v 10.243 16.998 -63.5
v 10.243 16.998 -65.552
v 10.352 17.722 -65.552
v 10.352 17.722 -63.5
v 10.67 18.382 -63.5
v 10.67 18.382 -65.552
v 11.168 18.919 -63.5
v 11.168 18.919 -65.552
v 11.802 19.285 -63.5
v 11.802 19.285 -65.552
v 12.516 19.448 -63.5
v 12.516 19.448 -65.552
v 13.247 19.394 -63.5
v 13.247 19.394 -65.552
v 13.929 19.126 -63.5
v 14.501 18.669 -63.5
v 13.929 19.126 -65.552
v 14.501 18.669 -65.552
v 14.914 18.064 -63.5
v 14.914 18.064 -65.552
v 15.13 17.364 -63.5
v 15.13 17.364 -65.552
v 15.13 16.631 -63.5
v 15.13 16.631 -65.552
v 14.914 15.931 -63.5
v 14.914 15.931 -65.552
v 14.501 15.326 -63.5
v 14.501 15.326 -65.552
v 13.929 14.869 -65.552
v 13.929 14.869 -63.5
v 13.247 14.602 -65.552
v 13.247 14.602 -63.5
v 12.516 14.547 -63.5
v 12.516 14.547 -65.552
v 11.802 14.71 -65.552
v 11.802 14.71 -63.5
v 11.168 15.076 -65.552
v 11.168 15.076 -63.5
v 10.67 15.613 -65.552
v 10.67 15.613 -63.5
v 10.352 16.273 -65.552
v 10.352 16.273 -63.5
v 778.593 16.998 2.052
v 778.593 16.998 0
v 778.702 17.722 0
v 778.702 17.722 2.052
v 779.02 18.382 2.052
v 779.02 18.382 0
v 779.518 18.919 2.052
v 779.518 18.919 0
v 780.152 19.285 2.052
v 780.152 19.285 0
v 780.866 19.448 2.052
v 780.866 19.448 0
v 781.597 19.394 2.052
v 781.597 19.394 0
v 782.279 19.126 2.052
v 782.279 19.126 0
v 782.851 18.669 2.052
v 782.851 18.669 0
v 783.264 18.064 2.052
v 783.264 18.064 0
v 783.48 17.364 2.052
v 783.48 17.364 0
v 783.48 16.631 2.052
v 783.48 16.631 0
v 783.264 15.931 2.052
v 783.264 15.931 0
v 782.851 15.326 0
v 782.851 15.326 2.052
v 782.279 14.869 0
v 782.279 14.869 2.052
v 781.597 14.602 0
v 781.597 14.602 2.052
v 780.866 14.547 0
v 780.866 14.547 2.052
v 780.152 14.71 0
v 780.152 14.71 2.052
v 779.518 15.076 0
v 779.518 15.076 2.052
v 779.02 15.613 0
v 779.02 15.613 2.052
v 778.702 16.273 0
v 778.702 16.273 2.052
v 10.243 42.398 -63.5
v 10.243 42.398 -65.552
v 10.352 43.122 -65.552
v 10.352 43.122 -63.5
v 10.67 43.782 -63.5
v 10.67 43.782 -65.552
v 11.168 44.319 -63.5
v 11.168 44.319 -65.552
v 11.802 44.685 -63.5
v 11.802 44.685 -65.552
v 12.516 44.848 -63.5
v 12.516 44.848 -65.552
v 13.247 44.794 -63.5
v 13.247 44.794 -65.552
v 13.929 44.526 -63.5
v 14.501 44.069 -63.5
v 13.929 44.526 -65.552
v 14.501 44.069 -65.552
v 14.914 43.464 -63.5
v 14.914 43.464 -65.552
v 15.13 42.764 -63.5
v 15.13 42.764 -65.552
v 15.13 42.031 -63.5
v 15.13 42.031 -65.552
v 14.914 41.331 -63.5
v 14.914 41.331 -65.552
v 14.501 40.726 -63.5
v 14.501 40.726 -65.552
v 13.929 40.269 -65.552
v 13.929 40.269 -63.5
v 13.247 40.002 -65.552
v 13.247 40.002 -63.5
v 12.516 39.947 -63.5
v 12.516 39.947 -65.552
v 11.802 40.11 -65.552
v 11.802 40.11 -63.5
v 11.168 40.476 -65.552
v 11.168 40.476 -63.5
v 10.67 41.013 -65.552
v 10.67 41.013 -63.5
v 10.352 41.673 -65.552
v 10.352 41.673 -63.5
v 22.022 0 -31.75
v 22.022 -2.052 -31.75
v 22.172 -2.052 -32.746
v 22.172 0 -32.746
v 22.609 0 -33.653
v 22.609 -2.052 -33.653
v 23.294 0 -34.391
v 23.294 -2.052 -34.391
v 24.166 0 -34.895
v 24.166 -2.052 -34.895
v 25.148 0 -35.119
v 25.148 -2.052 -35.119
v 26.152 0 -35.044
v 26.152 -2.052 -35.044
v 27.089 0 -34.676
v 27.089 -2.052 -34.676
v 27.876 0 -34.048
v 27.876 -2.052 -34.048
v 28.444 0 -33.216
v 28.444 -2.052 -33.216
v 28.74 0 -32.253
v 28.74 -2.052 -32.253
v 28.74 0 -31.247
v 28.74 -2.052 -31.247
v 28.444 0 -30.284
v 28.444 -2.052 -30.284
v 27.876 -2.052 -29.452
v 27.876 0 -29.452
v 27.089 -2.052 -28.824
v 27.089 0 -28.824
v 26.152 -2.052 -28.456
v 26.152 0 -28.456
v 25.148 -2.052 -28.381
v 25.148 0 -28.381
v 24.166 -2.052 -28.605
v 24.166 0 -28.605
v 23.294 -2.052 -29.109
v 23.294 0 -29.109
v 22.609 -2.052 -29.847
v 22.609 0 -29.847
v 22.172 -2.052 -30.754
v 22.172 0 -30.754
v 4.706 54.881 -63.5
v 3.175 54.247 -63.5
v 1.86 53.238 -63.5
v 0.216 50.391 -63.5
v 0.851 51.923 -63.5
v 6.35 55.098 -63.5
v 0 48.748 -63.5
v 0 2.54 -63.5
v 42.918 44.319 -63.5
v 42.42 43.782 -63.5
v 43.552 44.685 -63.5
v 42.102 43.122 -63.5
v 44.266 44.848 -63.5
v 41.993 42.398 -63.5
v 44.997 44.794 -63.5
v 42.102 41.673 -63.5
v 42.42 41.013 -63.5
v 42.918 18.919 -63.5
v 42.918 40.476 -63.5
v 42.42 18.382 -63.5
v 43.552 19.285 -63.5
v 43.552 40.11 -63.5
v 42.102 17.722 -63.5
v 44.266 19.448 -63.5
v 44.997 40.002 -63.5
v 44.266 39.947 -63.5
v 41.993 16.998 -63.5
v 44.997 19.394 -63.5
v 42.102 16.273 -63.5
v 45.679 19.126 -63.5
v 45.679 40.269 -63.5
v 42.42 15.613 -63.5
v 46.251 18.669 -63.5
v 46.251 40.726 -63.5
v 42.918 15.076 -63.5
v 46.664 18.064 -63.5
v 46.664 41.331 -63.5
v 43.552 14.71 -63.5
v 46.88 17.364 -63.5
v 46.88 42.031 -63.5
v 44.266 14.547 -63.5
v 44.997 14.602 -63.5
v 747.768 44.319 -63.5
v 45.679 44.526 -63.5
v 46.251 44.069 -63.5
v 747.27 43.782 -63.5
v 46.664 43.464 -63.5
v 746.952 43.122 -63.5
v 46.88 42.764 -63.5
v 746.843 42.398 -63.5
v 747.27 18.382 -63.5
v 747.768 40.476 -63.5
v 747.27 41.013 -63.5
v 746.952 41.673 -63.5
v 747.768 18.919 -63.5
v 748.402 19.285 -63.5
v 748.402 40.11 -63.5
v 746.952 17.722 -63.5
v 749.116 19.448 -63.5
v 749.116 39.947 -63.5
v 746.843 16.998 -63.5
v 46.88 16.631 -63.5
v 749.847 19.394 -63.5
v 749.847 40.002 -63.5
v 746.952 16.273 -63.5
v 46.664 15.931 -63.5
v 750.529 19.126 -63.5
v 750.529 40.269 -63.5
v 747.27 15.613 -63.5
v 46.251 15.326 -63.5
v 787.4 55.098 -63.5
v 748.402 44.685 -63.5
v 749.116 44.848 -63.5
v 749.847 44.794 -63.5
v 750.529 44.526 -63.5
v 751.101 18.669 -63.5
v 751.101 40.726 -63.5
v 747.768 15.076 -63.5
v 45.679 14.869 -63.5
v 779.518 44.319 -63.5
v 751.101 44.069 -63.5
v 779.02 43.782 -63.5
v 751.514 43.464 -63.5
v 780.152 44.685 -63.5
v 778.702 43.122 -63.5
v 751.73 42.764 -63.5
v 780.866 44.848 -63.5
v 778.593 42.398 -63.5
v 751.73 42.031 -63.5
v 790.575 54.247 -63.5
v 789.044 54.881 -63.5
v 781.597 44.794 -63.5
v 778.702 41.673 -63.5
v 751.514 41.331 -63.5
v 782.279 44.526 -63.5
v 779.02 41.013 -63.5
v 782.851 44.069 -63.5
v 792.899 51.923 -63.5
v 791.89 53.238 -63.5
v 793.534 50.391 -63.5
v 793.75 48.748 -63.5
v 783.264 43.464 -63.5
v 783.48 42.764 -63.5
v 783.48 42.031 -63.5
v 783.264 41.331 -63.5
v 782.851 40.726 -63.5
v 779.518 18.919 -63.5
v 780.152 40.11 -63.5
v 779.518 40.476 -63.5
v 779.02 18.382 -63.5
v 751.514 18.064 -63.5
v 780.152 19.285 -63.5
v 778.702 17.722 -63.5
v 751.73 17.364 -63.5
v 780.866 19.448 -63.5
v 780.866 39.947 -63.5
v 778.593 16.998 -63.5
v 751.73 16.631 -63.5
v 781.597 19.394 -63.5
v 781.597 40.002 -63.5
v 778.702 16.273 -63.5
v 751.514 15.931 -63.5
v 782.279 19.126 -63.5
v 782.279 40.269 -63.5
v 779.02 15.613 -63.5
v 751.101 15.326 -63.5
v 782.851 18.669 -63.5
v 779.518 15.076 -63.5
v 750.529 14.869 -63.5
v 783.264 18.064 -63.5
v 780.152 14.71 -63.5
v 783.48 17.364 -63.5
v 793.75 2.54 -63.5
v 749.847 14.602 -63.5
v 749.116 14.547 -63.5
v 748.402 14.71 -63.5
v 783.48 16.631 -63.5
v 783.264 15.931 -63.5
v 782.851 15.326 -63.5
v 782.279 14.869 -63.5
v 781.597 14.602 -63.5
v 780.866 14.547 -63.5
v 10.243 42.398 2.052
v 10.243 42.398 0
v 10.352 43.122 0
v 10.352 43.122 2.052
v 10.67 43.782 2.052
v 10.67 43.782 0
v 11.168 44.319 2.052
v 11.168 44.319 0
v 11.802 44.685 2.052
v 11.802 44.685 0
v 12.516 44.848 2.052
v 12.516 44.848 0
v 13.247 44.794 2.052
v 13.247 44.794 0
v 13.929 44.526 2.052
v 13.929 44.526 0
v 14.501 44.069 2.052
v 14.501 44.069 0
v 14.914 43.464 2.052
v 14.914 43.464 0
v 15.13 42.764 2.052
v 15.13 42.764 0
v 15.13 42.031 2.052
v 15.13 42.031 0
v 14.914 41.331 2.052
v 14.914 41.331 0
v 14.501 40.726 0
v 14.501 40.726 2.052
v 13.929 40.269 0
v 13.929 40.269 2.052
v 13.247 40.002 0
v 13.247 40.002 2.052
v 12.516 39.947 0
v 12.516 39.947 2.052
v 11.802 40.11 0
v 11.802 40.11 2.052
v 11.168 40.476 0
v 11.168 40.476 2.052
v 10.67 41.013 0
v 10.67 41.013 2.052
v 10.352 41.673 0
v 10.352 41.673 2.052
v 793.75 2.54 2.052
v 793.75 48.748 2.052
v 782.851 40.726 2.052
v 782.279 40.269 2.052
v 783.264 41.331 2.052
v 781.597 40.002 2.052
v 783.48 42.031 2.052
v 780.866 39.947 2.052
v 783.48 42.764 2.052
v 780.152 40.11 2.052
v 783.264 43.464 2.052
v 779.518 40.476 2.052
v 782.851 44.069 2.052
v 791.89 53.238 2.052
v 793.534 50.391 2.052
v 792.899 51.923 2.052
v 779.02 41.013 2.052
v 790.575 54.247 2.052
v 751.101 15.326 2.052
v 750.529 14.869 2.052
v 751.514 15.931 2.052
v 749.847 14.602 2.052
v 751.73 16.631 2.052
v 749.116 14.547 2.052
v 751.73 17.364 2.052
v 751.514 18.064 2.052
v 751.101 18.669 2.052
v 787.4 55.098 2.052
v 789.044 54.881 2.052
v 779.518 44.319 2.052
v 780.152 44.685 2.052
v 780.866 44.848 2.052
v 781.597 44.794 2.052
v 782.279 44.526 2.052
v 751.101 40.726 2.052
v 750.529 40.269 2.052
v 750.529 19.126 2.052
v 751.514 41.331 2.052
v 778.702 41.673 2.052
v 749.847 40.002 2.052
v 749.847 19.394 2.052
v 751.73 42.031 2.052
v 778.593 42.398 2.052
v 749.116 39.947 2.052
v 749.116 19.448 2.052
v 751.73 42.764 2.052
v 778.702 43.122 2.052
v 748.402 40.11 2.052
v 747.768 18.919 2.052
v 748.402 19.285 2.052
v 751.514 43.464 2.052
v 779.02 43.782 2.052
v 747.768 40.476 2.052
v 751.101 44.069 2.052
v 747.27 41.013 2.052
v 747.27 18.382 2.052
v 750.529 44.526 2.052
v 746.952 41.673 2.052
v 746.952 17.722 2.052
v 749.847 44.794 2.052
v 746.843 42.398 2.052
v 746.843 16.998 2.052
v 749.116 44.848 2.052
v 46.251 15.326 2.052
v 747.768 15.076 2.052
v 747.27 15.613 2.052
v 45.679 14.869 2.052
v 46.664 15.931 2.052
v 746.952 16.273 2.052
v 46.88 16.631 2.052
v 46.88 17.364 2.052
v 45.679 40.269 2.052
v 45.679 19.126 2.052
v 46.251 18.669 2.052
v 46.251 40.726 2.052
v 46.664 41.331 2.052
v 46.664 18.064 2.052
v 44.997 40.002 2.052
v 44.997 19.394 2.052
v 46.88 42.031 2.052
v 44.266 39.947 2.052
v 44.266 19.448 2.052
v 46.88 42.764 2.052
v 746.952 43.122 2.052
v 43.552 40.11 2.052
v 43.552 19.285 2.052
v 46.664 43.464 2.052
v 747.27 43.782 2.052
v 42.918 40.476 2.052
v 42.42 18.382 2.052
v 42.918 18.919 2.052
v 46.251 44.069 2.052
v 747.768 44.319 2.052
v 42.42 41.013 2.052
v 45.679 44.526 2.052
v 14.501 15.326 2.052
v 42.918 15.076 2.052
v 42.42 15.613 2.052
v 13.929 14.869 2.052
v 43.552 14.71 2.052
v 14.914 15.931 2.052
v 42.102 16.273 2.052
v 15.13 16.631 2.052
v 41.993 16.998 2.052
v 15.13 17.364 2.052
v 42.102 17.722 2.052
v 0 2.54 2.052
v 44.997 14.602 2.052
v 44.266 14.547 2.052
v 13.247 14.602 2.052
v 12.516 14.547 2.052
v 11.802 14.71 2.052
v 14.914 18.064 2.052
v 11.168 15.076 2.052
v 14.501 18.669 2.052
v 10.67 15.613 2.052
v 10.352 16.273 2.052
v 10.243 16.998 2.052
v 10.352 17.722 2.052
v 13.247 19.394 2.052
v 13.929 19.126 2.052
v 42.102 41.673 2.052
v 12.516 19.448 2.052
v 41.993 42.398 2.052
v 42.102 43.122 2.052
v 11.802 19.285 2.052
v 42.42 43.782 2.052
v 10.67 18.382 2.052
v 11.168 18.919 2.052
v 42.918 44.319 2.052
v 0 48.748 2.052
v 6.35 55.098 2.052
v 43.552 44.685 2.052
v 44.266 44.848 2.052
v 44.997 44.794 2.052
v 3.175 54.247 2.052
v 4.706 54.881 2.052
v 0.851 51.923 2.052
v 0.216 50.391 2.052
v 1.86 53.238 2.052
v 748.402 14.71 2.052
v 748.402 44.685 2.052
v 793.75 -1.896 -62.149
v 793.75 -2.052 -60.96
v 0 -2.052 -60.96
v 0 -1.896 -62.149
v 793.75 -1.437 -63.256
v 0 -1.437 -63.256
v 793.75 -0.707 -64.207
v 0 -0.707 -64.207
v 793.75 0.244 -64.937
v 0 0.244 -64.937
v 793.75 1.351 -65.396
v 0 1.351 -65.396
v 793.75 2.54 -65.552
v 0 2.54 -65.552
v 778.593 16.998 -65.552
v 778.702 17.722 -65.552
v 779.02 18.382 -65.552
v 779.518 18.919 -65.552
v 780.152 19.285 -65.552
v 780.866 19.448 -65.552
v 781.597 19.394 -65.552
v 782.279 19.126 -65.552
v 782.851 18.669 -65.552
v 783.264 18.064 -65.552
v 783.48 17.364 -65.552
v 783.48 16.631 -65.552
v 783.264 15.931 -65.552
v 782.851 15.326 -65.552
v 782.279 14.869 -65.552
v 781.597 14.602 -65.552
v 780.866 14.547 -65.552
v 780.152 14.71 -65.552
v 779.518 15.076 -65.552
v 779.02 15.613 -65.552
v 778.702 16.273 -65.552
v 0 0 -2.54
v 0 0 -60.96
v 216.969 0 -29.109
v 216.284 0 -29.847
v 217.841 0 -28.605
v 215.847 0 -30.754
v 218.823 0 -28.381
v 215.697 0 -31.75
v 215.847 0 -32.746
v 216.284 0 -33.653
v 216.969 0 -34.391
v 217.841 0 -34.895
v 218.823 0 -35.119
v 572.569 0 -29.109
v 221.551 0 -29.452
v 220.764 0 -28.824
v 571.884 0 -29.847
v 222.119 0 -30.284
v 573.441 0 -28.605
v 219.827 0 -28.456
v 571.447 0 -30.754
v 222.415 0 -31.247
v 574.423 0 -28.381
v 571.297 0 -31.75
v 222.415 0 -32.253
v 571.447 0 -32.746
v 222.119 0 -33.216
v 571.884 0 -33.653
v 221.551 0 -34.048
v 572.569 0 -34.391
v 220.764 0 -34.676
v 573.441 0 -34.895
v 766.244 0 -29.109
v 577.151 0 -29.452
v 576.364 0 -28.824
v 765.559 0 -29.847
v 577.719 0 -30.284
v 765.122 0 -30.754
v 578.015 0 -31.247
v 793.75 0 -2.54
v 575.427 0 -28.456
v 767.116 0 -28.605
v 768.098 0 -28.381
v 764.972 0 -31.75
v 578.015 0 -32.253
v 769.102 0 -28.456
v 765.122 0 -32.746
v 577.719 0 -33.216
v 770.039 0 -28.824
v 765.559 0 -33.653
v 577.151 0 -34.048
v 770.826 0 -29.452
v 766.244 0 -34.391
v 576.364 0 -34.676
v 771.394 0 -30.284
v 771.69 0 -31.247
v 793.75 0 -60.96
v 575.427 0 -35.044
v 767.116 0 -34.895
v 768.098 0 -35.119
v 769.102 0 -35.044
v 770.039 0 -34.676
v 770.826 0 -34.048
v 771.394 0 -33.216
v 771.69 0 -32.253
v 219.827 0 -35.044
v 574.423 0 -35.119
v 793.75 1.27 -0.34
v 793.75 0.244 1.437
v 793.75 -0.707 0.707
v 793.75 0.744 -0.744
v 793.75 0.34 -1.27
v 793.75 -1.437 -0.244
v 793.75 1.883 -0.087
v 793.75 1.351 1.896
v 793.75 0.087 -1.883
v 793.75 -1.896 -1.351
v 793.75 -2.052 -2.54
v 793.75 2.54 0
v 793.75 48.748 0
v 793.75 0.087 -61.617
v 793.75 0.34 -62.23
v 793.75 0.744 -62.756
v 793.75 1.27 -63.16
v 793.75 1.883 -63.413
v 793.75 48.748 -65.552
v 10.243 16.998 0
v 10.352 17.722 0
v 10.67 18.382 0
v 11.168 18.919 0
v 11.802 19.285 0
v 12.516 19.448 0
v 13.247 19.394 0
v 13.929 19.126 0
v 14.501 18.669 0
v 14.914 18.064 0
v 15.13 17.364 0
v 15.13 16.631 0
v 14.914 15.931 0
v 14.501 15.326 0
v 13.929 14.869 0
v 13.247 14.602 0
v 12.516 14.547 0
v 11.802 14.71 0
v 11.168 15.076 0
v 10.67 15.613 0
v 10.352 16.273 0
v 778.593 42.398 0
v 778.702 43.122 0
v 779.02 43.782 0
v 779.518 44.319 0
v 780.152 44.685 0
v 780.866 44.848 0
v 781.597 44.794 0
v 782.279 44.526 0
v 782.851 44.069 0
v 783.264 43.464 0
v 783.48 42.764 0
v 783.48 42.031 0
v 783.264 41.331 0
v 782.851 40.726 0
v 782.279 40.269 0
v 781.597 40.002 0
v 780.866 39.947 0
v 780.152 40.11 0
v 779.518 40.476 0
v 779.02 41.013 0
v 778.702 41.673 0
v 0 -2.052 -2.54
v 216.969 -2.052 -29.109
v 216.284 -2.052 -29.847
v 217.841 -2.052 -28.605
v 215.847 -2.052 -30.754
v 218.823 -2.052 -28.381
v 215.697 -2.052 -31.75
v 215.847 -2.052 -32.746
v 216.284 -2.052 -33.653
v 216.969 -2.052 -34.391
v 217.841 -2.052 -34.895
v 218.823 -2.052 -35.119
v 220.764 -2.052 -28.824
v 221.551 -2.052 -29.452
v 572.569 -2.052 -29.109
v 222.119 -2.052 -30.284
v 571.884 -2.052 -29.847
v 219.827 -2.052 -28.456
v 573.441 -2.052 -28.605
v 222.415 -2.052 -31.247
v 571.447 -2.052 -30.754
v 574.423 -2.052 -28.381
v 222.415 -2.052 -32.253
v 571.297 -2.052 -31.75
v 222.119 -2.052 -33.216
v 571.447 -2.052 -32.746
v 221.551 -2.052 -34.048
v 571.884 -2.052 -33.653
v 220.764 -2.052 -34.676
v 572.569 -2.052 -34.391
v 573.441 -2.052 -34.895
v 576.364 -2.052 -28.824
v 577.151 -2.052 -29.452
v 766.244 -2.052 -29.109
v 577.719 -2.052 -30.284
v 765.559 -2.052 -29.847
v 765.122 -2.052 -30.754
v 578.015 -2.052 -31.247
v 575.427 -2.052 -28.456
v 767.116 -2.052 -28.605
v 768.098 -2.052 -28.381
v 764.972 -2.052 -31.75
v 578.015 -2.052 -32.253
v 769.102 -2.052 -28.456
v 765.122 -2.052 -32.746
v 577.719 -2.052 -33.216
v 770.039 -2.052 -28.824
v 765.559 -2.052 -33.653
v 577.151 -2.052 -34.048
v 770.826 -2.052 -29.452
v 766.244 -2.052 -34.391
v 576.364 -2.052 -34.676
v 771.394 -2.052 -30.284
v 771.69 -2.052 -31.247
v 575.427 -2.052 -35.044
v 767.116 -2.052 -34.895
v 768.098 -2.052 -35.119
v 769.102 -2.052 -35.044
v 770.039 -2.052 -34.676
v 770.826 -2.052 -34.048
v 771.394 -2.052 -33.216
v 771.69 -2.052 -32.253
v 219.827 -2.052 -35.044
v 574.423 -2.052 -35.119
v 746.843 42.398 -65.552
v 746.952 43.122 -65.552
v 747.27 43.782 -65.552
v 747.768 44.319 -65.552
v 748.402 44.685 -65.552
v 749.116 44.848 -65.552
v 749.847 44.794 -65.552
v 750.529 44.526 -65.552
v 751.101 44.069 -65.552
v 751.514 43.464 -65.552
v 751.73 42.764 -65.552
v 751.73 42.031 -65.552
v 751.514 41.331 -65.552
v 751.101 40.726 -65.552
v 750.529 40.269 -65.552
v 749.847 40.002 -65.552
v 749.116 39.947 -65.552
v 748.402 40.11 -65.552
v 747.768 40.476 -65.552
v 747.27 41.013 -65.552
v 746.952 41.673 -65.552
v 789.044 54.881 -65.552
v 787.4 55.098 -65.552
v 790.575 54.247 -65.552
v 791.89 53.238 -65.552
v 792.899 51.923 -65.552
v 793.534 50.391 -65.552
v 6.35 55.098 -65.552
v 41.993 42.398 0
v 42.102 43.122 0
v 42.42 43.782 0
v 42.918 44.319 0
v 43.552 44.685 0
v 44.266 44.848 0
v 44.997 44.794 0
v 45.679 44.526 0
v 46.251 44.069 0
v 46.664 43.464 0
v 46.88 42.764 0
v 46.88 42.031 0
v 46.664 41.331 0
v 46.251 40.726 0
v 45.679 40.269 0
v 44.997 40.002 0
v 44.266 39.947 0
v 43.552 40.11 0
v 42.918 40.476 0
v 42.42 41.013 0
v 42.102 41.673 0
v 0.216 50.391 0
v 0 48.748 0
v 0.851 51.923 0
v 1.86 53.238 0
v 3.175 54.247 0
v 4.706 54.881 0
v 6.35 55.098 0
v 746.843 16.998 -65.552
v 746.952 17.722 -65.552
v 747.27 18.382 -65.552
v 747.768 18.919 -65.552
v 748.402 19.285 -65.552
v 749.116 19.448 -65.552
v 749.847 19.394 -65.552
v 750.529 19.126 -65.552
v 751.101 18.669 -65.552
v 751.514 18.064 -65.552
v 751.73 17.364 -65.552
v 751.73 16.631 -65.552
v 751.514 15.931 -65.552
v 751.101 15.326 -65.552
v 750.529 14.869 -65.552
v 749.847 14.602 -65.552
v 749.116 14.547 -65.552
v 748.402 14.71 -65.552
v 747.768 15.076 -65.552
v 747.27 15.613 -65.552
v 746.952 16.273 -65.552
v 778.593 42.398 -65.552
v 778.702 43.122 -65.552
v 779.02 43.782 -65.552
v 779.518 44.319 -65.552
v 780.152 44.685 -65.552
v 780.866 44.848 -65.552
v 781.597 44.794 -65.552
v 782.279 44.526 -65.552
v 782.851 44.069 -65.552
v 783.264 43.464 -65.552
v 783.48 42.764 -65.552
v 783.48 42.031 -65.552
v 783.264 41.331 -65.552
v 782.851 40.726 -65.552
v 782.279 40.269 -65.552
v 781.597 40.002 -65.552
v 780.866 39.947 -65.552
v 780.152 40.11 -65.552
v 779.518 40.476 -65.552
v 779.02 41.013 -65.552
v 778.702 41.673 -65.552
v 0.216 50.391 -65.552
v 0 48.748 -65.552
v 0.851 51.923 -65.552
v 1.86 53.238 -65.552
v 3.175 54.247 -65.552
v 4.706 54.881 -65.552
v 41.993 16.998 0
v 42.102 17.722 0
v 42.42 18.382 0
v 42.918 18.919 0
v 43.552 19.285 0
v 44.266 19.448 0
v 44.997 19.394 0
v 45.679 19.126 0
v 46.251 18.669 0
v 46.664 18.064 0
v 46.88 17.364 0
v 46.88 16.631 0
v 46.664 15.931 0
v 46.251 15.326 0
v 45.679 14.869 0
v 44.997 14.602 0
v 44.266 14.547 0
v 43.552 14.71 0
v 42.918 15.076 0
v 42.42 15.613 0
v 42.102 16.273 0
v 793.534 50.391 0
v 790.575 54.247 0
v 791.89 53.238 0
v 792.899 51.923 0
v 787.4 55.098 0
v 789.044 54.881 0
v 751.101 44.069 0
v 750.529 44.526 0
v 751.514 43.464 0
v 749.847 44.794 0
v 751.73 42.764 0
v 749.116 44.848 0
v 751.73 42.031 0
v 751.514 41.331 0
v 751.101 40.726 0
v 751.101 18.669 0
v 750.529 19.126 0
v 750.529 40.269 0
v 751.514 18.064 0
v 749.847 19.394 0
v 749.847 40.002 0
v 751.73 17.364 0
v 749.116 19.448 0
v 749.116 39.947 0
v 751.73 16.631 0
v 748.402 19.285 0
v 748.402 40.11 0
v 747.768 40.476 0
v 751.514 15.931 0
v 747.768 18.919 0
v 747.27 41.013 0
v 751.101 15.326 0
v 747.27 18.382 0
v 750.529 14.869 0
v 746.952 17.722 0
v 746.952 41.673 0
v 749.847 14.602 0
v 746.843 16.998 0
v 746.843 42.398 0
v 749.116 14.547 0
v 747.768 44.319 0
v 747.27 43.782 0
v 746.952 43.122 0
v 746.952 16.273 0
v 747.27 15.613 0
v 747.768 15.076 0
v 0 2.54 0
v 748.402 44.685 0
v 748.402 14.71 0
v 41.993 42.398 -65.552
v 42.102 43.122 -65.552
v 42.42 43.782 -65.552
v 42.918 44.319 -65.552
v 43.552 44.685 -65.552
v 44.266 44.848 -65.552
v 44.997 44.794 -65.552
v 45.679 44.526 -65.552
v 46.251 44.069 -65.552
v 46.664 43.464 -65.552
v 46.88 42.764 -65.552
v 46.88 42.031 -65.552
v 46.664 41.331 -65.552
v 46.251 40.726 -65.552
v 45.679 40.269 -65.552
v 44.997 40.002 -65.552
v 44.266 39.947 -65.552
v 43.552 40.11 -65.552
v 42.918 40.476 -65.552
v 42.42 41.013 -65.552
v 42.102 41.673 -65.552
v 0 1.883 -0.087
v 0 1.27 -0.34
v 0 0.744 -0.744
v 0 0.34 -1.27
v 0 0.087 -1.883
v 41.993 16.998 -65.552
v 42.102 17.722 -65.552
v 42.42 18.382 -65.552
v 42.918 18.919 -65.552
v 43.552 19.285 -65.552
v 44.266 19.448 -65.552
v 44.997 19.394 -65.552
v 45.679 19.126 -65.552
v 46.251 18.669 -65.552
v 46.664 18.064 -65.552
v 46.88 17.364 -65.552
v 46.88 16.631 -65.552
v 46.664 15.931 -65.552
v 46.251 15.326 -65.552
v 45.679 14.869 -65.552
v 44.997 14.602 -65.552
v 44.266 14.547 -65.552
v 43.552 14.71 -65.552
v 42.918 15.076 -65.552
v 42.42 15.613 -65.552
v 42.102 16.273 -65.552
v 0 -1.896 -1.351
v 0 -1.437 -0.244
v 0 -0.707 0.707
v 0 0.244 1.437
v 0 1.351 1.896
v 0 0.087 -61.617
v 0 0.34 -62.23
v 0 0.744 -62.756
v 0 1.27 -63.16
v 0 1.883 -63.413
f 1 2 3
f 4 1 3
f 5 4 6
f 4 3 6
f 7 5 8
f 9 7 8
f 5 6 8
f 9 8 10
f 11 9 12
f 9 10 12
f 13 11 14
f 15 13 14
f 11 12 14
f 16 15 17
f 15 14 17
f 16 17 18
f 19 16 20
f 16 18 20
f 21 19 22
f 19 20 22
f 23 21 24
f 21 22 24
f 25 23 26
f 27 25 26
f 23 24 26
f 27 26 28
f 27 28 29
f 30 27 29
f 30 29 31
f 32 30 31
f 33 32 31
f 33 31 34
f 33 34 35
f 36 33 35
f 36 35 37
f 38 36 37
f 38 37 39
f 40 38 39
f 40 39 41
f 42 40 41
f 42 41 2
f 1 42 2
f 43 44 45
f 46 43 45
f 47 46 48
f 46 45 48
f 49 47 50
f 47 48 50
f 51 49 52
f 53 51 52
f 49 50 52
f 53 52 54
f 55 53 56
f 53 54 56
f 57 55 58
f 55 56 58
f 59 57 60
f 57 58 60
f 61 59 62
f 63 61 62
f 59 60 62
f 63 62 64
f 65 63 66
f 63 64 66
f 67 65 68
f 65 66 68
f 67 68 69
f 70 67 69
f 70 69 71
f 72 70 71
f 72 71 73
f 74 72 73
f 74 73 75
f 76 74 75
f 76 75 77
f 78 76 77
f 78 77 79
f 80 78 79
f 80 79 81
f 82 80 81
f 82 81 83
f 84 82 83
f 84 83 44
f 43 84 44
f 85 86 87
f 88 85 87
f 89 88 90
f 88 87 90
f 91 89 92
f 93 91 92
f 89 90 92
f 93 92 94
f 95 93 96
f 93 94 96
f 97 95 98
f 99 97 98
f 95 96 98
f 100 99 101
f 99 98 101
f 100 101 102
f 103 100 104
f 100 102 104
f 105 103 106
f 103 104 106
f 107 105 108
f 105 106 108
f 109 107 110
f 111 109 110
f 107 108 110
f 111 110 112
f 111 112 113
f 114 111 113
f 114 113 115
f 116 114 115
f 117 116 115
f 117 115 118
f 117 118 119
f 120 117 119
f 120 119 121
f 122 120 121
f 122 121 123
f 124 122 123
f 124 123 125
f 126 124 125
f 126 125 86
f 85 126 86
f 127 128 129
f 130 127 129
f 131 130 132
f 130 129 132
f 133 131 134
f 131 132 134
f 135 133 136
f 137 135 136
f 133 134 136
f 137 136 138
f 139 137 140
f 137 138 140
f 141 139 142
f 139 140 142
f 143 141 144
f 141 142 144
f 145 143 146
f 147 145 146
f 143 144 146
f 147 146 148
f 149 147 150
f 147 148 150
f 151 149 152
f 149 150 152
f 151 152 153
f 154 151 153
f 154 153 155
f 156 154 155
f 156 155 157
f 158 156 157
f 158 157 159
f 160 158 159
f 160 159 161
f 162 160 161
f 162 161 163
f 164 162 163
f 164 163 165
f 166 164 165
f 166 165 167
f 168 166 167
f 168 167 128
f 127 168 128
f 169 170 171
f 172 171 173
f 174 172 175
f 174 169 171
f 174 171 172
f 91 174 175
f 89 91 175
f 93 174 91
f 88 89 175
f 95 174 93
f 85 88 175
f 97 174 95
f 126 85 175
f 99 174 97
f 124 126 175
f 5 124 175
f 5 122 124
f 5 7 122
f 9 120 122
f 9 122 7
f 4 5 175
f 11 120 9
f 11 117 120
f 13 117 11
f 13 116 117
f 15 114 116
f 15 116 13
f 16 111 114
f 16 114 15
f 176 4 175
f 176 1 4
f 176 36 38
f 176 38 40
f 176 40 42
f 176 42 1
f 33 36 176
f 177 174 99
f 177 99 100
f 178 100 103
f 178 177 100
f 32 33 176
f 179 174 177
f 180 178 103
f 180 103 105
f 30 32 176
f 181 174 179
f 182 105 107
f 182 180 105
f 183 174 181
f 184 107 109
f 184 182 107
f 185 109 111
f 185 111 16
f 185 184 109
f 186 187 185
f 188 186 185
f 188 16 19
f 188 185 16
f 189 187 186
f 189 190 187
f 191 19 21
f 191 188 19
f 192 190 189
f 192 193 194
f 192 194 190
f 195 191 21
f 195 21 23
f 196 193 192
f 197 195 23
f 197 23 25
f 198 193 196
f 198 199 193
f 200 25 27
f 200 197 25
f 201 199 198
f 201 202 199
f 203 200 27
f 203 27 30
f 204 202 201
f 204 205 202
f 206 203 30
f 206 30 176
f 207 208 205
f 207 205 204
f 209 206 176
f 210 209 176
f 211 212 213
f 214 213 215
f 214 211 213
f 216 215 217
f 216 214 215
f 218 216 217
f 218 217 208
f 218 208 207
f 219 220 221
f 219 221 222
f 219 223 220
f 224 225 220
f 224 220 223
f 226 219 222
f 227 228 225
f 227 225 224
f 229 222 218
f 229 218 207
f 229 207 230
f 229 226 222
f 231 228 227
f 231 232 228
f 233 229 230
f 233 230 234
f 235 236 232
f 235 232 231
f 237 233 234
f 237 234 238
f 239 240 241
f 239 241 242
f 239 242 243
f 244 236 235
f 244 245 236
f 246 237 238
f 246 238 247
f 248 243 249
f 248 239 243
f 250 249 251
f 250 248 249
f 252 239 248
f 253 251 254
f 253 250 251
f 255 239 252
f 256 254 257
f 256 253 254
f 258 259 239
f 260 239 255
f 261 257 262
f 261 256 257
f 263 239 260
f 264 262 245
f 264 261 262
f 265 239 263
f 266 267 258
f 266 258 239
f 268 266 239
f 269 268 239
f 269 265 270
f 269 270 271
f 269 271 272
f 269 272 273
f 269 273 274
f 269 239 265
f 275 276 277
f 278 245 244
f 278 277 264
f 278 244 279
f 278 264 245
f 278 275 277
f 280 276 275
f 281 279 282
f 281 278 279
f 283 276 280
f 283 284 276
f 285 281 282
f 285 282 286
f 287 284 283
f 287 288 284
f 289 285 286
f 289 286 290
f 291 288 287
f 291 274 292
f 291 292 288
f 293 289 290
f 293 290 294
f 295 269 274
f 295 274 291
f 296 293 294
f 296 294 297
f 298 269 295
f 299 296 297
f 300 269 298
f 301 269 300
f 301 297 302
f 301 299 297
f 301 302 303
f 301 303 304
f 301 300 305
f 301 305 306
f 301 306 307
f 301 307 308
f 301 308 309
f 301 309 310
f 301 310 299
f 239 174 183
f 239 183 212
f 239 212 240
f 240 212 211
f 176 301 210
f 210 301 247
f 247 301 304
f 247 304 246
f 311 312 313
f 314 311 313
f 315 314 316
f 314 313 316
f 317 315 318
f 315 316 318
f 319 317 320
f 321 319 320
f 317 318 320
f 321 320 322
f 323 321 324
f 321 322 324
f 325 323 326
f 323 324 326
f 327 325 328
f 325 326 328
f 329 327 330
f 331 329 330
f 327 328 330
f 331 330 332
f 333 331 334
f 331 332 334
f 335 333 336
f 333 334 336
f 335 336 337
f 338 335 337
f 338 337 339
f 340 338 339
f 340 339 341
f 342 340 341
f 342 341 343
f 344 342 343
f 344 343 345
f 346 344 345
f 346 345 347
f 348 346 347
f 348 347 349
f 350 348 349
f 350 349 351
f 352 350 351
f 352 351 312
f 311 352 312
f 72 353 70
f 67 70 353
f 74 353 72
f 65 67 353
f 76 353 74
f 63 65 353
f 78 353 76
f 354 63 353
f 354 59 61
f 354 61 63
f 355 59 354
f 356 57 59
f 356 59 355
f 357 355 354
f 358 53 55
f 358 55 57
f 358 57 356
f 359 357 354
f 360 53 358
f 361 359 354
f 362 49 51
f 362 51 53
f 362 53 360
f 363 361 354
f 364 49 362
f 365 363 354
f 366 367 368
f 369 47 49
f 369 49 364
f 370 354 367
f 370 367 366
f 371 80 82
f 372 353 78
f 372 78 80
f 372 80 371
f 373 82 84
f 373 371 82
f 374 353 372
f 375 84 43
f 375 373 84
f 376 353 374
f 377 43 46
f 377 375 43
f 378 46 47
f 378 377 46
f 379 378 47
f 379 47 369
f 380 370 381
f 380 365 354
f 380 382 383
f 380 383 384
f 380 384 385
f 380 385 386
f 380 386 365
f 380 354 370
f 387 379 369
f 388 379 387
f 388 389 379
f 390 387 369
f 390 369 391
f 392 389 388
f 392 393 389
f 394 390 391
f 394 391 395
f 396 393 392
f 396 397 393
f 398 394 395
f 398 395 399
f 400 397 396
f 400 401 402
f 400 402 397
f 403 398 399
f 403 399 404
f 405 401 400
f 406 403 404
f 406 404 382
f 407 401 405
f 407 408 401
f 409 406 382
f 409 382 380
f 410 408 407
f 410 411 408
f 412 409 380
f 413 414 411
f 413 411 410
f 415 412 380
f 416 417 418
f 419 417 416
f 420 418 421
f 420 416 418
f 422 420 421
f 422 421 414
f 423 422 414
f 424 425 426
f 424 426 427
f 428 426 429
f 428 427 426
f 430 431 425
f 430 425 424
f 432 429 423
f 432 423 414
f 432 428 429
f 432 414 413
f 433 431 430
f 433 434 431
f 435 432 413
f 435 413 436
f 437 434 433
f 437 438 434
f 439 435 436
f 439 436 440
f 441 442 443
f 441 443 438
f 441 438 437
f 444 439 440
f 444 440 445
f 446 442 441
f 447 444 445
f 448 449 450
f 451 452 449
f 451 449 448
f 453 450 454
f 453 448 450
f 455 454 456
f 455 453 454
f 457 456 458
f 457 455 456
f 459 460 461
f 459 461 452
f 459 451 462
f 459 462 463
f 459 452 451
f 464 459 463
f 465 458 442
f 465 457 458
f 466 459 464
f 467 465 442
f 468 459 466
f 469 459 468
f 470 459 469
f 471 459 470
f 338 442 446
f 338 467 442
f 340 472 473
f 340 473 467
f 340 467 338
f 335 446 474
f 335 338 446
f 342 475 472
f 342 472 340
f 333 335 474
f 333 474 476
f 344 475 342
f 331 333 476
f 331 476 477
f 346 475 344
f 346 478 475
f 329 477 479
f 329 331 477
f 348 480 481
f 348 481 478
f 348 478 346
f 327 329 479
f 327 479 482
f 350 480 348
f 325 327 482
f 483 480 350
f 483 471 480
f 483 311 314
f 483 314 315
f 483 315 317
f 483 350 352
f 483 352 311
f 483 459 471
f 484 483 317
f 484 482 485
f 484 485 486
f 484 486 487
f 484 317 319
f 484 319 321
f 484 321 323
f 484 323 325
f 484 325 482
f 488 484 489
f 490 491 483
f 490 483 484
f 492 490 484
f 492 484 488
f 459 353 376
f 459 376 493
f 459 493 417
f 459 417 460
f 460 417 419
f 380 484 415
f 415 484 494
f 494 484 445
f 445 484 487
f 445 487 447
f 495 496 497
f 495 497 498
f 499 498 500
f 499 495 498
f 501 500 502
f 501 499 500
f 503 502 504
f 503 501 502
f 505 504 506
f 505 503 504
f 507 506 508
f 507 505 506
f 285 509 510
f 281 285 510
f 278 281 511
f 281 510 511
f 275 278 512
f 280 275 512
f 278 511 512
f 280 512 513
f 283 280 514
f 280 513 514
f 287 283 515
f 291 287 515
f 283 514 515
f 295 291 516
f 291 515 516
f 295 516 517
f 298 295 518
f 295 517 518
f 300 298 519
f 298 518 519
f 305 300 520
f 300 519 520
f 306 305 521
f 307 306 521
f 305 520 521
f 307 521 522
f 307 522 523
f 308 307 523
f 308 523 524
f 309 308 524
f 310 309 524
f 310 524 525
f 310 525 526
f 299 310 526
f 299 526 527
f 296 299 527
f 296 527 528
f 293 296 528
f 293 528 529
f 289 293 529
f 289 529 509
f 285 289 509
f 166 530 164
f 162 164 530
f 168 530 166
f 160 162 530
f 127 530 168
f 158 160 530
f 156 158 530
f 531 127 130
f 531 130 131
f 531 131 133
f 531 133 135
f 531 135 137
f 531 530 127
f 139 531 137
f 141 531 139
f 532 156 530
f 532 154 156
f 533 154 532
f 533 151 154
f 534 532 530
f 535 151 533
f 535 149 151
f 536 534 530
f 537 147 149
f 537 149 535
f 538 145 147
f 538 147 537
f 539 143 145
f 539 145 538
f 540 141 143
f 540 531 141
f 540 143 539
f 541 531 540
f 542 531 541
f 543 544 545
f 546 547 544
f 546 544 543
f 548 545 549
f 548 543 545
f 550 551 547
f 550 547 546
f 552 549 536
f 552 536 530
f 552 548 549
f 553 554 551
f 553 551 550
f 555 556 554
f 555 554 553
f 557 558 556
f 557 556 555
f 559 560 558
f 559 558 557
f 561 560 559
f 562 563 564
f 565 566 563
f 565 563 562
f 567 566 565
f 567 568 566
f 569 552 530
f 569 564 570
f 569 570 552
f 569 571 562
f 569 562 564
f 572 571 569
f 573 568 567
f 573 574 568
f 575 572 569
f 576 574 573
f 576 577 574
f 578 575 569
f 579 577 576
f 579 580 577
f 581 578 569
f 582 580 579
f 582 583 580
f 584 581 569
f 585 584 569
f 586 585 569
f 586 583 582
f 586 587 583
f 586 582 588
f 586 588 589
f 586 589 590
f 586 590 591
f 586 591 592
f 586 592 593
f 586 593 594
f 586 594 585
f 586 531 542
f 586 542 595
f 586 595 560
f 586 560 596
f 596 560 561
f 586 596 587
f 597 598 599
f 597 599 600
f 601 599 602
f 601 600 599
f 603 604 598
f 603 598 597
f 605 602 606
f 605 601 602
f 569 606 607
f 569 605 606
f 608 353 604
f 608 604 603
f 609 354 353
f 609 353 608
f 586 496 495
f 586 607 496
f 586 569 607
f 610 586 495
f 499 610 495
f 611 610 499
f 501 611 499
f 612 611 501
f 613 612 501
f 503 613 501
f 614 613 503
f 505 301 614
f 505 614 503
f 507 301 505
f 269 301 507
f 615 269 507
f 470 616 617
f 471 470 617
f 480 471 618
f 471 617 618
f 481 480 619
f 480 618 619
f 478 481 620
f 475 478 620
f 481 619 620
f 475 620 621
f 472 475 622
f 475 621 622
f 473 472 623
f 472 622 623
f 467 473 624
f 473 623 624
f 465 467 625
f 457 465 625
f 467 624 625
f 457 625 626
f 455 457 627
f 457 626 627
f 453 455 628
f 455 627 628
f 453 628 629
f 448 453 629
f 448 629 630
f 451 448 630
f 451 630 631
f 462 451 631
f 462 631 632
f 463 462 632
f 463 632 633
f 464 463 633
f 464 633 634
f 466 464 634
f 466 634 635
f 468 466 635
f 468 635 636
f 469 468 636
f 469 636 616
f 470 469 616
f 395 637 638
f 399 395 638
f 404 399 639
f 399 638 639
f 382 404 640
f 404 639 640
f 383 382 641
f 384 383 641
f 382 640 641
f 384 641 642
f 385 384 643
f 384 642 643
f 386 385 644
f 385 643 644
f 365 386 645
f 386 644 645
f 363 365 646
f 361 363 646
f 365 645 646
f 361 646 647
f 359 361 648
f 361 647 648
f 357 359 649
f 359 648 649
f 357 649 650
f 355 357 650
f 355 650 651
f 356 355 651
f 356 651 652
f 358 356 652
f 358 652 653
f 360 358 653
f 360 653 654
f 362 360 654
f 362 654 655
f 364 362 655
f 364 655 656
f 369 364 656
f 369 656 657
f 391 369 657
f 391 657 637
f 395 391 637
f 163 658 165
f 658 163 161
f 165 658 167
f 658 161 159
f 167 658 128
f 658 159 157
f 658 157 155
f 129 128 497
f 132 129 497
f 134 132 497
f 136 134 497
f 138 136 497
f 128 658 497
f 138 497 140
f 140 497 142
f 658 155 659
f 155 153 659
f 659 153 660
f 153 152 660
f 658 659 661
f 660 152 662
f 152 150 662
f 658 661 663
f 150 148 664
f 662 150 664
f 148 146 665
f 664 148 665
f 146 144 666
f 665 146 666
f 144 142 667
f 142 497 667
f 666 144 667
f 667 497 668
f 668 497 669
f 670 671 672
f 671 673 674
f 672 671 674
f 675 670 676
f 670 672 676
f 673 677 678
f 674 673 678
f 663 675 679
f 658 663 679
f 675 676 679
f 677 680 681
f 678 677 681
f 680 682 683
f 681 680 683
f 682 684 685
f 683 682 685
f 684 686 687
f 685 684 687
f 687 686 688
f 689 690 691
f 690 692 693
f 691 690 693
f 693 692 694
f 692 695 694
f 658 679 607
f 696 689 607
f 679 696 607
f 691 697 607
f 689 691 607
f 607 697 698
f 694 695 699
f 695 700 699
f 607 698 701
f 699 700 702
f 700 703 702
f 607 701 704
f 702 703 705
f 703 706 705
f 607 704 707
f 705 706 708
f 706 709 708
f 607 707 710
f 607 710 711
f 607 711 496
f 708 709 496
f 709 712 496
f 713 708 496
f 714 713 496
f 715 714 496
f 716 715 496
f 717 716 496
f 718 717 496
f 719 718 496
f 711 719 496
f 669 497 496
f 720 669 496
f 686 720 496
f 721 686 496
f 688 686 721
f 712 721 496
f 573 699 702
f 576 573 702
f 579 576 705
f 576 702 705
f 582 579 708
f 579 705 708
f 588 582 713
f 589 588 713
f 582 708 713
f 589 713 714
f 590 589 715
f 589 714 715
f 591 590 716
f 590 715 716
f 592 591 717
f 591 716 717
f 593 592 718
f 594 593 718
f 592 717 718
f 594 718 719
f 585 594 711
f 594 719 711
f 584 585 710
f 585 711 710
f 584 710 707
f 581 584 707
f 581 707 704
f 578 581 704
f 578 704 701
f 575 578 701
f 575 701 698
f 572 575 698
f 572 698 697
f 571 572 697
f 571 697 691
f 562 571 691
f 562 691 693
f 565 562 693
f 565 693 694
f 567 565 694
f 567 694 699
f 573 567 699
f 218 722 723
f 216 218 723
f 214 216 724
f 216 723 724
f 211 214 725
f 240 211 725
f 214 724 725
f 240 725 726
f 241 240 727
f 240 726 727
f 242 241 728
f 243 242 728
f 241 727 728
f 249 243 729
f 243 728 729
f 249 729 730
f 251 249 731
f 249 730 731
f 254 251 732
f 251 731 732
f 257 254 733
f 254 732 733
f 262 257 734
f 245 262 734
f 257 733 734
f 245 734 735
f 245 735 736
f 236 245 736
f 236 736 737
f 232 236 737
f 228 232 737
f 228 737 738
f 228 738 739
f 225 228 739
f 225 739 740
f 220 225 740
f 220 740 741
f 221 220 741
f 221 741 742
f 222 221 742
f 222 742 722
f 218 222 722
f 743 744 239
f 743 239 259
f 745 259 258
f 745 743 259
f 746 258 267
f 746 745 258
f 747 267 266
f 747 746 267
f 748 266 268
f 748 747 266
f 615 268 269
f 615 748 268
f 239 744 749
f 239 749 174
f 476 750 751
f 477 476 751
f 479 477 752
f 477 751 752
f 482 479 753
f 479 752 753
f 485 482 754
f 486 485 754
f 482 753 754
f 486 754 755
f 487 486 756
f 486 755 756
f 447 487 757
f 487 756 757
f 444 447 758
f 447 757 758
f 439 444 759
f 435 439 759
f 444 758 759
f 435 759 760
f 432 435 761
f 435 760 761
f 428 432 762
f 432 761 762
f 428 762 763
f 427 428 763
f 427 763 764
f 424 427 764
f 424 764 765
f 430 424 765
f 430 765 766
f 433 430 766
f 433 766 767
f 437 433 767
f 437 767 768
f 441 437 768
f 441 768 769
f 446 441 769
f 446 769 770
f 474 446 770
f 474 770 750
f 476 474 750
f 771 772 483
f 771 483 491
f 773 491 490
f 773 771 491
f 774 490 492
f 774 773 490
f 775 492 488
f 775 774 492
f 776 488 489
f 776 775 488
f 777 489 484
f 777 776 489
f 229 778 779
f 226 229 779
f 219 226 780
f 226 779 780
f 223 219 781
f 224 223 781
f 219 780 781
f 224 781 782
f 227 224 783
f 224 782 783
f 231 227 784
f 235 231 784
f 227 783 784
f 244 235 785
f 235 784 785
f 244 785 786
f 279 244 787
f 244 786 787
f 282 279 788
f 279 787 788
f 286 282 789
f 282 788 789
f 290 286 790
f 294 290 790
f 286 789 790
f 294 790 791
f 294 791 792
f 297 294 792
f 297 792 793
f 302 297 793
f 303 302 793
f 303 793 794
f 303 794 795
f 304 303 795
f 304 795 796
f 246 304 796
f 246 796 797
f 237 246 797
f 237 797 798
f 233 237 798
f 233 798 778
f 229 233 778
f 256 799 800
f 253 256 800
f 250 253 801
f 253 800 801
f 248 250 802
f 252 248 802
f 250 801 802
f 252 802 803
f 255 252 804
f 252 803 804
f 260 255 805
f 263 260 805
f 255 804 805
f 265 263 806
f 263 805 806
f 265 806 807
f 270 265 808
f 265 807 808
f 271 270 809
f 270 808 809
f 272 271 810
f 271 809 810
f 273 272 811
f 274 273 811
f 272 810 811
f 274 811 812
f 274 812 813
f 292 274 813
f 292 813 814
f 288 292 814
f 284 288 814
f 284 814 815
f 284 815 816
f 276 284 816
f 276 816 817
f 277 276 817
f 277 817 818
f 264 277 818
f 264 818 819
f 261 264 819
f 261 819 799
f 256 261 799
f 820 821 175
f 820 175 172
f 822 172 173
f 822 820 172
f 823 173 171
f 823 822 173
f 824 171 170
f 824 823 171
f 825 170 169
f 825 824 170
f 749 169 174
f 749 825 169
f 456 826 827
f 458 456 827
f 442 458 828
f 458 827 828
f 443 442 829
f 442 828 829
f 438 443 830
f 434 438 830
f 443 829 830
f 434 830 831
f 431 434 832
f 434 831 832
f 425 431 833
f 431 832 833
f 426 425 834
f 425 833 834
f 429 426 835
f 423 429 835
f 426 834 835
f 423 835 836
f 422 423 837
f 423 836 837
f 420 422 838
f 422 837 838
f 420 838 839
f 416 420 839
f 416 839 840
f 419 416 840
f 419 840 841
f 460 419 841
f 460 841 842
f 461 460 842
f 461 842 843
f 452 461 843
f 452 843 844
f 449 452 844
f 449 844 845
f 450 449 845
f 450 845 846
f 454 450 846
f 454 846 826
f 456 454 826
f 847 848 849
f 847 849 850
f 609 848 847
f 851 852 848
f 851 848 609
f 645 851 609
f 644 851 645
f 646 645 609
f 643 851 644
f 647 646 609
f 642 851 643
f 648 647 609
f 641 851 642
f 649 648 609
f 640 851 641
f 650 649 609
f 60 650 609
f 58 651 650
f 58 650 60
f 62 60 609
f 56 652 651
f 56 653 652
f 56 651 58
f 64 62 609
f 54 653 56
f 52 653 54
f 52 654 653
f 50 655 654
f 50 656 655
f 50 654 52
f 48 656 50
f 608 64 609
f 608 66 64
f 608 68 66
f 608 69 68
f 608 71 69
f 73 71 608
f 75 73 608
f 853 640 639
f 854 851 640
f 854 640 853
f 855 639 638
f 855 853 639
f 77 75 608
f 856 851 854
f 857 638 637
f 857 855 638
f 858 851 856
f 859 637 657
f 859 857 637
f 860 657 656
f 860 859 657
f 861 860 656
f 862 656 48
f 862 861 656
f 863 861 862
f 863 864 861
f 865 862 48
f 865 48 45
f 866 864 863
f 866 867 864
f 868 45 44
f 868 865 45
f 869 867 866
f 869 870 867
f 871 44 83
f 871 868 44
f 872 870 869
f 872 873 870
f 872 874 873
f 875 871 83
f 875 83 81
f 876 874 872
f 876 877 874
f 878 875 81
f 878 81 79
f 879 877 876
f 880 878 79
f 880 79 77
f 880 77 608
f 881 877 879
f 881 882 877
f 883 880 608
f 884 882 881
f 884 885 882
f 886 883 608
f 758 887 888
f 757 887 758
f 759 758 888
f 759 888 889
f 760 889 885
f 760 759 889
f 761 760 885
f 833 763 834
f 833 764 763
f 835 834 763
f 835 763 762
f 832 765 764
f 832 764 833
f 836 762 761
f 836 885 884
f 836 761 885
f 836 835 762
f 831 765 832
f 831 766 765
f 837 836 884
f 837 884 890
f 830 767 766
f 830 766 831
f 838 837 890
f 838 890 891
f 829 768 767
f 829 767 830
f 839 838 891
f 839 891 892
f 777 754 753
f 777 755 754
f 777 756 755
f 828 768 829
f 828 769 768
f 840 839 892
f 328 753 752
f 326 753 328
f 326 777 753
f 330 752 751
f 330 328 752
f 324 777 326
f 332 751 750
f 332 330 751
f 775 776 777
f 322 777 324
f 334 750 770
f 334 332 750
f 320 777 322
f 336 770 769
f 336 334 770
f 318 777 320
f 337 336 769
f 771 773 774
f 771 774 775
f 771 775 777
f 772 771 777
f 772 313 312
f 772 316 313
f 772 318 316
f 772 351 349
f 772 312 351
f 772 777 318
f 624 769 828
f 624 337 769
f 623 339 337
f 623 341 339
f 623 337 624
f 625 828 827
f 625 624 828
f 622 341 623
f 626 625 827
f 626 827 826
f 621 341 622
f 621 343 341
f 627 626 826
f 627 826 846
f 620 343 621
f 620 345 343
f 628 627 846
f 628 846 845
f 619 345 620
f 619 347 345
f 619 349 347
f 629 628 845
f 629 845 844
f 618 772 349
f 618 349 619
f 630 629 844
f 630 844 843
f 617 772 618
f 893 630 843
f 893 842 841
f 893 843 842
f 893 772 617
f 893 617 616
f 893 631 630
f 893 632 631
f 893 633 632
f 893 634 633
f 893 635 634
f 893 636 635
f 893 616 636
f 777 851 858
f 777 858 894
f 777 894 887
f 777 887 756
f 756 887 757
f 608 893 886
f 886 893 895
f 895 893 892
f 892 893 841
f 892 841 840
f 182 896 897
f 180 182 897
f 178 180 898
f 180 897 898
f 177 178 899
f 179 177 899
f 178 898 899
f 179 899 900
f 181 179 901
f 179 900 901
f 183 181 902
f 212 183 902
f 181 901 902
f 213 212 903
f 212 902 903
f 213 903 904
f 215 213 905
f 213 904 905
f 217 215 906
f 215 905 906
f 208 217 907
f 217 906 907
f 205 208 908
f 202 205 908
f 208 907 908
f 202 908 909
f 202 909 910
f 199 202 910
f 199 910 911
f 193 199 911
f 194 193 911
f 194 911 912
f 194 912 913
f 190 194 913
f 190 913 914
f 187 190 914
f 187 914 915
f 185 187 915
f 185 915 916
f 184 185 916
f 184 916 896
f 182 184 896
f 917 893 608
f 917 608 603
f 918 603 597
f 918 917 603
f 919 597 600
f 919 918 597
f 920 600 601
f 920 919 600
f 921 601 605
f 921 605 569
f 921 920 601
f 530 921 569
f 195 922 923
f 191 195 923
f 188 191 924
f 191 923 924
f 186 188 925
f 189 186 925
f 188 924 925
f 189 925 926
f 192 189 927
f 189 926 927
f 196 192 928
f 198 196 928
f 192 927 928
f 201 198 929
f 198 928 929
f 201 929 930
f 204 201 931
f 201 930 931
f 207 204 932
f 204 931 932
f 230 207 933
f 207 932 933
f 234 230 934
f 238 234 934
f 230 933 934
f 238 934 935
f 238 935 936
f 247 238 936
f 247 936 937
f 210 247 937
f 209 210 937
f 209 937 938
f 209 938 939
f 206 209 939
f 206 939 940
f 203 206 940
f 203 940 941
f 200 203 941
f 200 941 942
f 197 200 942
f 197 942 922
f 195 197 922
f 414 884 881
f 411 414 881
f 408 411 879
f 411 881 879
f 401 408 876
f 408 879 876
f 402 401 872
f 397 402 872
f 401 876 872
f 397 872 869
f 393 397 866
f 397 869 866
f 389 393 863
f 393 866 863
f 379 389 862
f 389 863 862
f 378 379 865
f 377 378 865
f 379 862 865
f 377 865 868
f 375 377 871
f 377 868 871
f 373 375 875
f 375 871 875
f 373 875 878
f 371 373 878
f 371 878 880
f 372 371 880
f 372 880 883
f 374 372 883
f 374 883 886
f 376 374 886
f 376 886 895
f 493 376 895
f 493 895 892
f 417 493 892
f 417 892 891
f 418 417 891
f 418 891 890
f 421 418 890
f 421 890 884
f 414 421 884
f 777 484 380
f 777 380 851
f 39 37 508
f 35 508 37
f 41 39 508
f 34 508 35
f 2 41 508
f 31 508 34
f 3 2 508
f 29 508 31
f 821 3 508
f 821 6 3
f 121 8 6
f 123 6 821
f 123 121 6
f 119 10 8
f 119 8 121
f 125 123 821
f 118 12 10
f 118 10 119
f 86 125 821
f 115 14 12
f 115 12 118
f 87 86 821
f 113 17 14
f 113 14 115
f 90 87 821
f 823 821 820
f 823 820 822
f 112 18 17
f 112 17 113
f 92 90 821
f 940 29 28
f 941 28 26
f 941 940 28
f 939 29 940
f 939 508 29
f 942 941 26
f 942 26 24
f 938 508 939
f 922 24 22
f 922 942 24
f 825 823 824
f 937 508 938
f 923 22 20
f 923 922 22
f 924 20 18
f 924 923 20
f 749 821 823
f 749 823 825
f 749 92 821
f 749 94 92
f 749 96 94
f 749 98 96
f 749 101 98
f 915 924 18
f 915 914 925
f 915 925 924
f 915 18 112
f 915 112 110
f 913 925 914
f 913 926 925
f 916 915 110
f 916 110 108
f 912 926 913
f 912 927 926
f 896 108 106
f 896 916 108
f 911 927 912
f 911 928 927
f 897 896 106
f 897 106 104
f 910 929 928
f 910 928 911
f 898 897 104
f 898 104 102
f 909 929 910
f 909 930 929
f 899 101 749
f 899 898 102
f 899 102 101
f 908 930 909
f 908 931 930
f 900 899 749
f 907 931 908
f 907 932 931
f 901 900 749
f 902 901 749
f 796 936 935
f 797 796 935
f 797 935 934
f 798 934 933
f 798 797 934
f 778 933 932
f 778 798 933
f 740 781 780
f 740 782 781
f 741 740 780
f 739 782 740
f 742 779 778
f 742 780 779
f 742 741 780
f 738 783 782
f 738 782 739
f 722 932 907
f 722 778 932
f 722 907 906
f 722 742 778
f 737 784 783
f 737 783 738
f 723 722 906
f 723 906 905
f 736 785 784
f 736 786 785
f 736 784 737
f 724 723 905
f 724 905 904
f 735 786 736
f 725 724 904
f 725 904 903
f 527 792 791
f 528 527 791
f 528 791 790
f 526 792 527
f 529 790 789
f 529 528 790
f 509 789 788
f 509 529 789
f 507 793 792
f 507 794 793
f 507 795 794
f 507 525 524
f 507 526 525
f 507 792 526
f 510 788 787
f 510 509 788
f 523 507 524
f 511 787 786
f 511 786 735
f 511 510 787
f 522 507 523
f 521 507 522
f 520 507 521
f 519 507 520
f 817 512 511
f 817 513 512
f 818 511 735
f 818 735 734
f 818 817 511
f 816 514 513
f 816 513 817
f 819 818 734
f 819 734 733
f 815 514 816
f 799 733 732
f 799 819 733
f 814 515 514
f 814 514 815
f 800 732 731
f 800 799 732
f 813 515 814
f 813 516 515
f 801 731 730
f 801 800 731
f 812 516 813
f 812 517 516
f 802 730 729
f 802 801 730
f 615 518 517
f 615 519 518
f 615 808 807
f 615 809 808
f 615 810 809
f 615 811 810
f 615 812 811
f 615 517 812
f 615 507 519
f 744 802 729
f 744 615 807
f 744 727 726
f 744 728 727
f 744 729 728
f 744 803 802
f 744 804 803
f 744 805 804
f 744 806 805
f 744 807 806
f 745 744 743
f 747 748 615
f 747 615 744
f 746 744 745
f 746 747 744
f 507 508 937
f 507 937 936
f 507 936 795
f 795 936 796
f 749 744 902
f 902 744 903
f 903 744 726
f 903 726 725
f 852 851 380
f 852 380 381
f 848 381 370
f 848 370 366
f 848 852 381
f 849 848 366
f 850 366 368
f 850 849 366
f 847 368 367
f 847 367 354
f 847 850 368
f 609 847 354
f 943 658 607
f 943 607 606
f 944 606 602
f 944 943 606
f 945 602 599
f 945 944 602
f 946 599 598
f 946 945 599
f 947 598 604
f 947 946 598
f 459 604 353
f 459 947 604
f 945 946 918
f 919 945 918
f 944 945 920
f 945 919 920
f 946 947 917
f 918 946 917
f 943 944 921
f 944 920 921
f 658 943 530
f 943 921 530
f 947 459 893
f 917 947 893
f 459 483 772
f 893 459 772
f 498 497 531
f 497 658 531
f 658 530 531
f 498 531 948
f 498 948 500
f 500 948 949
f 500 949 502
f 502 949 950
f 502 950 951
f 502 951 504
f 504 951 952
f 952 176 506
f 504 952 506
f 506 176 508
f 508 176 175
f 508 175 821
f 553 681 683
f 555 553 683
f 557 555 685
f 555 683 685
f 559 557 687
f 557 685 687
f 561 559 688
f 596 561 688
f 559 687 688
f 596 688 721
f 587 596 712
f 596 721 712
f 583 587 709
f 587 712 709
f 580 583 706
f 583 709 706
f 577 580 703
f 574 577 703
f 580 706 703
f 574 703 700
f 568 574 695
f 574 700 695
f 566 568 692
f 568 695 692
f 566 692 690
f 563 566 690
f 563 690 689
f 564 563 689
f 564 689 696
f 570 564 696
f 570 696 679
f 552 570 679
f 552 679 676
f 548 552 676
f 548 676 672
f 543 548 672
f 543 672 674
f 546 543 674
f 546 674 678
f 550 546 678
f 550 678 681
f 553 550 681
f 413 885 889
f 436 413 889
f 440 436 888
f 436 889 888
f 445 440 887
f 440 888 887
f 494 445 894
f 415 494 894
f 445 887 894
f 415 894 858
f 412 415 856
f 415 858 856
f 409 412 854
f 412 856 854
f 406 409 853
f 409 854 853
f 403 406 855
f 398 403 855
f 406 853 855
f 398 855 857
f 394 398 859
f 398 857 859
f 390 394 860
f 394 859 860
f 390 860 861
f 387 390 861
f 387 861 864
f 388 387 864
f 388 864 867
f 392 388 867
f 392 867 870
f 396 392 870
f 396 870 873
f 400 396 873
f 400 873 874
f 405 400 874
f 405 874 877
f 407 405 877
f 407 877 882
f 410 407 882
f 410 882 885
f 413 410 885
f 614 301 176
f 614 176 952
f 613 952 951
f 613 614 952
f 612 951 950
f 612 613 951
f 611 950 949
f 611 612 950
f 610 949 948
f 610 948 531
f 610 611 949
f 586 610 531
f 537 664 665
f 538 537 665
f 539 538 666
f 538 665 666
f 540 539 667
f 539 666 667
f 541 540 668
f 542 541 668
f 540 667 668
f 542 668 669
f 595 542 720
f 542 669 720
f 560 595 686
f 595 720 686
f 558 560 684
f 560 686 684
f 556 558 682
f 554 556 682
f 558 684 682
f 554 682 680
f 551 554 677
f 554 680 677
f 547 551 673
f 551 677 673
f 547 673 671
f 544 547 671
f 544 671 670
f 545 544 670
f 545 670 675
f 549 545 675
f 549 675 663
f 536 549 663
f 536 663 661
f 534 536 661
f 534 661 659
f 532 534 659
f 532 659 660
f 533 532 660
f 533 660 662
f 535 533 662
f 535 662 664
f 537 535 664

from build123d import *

# Parameters (mm, degrees)
SKETCH1_W                      = 793.75
SKETCH1_H                      = 63.5
BASE_FLANGE1_DEPTH             = 2.05232
EDGE_FLANGE1_STRIP_W           = 13.28928
EDGE_FLANGE1_STRIP_H           = 2.05232
EDGE_FLANGE1_STRIP_CUT_DEPTH   = 793.75
EDGE_FLANGE1_STRIP_2_W         = 13.28928
EDGE_FLANGE1_STRIP_2_H         = 2.05232
EDGE_FLANGE1_STRIP_CUT_2_DEPTH = 793.75
EDGE_FLANGE1_DEPTH             = 793.75
EDGE_FLANGE1_BEND_DEPTH        = 793.75
F_10_0_1935_DIAMETER_HOLE1_D   = 4.9149
BREAK_CORNER1_START            = -65.55232
BREAK_CORNER1_DEPTH            = 67.60464
F_1_4_CLEARANCE_HOLE1_D        = 6.7564


# Read off the part's stored shape, not the designer's step: Break-Corner1
# Sheet-metal steps are written as plain solids
with BuildPart() as part:
    # Sketch1 → Base-Flange1 (new body)
    with BuildSketch(Plane(origin=(0, 0, 0), x_dir=(1, 0, 0), z_dir=(0, 1, 0))):
        with Locations((396.875, 31.75)):
            Rectangle(SKETCH1_W, SKETCH1_H)
    extrude(amount=-BASE_FLANGE1_DEPTH)

    # Edge-Flange1 strip (across the edge) → Edge-Flange1 strip cut (cut)
    with BuildSketch(Plane(origin=(0, 0, 0), x_dir=(0, 0, -1), z_dir=(1, 0, 0))):
        with Locations((-4.10464, -1.02616)):
            Rectangle(EDGE_FLANGE1_STRIP_W, EDGE_FLANGE1_STRIP_H)
    extrude(amount=EDGE_FLANGE1_STRIP_CUT_DEPTH, mode=Mode.SUBTRACT)

    # Edge-Flange1 strip 2 (across the edge) → Edge-Flange1 strip cut 2 (cut)
    with BuildSketch(Plane(origin=(793.75, 0, -63.5), x_dir=(0, 0, 1), z_dir=(-1, 0, 0))):
        with Locations((-4.10464, -1.02616)):
            Rectangle(EDGE_FLANGE1_STRIP_2_W, EDGE_FLANGE1_STRIP_2_H)
    extrude(amount=EDGE_FLANGE1_STRIP_CUT_2_DEPTH, mode=Mode.SUBTRACT)

    # Edge-Flange1 section (across the edge) → Edge-Flange1 (add)
    with BuildSketch(Plane(origin=(0, 0, 0), x_dir=(0, 0, -1), z_dir=(1, 0, 0))):
        with BuildLine():
            Line((-2.05232, 2.54), (-2.05232, 55.09768))
            Line((-2.05232, 55.09768), (0, 55.09768))
            Line((0, 55.09768), (0, 2.54))
            ThreePointArc((0, 2.54), (0.743948776, 0.743948776), (2.54, 0))
            Line((2.54, 0), (2.54, -2.05232))
            ThreePointArc((2.54, -2.05232), (-0.707260613, -0.707260613), (-2.05232, 2.54))
        make_face()
    extrude(amount=EDGE_FLANGE1_DEPTH)

    # Edge-Flange1 section 2 (across the edge) → Edge-Flange1 bend (add)
    with BuildSketch(Plane(origin=(793.75, 0, -63.5), x_dir=(0, 0, 1), z_dir=(-1, 0, 0))):
        with BuildLine():
            Line((-2.05232, 2.54), (-2.05232, 55.09768))
            Line((-2.05232, 55.09768), (0, 55.09768))
            Line((0, 55.09768), (0, 2.54))
            ThreePointArc((0, 2.54), (0.743948776, 0.743948776), (2.54, 0))
            Line((2.54, 0), (2.54, -2.05232))
            ThreePointArc((2.54, -2.05232), (-0.707260613, -0.707260613), (-2.05232, 2.54))
        make_face()
    extrude(amount=EDGE_FLANGE1_BEND_DEPTH)

    # #10 (0.1935) Diameter Hole1 (through all)
    with Locations(Plane.XY.offset(2.05232)):
        with Locations((12.7, 42.39768), (12.7, 16.99768), (44.45, 42.39768), (44.45, 16.99768), (749.3, 16.99768), (781.05, 16.99768), (781.05, 42.39768), (749.3, 42.39768)):
            Hole(F_10_0_1935_DIAMETER_HOLE1_D / 2)

    # Break-Corner1 outline → Break-Corner1 (cut)
    with BuildSketch(Plane.XY.offset(BREAK_CORNER1_START)):
        with BuildLine():
            ThreePointArc((0, 48.74768), (1.859871939, 53.237808061), (6.35, 55.09768))
            Line((6.35, 55.09768), (0, 55.09768))
            Line((0, 55.09768), (0, 48.74768))
        make_face()
        with BuildLine():
            ThreePointArc((787.4, 55.09768), (791.890128061, 53.237808061), (793.75, 48.74768))
            Line((793.75, 48.74768), (793.75, 55.09768))
            Line((793.75, 55.09768), (787.4, 55.09768))
        make_face()
    extrude(amount=BREAK_CORNER1_DEPTH, mode=Mode.SUBTRACT)

    # 1/4 Clearance Hole1 (through all)
    with Locations(Plane(origin=(0, 0, 0), x_dir=(1, 0, 0), z_dir=(0, 1, 0))):
        with Locations((219.075, 31.75), (574.675, 31.75), (25.4, 31.75), (768.35, 31.75)):
            Hole(F_1_4_CLEARANCE_HOLE1_D / 2)


solid = part.part
